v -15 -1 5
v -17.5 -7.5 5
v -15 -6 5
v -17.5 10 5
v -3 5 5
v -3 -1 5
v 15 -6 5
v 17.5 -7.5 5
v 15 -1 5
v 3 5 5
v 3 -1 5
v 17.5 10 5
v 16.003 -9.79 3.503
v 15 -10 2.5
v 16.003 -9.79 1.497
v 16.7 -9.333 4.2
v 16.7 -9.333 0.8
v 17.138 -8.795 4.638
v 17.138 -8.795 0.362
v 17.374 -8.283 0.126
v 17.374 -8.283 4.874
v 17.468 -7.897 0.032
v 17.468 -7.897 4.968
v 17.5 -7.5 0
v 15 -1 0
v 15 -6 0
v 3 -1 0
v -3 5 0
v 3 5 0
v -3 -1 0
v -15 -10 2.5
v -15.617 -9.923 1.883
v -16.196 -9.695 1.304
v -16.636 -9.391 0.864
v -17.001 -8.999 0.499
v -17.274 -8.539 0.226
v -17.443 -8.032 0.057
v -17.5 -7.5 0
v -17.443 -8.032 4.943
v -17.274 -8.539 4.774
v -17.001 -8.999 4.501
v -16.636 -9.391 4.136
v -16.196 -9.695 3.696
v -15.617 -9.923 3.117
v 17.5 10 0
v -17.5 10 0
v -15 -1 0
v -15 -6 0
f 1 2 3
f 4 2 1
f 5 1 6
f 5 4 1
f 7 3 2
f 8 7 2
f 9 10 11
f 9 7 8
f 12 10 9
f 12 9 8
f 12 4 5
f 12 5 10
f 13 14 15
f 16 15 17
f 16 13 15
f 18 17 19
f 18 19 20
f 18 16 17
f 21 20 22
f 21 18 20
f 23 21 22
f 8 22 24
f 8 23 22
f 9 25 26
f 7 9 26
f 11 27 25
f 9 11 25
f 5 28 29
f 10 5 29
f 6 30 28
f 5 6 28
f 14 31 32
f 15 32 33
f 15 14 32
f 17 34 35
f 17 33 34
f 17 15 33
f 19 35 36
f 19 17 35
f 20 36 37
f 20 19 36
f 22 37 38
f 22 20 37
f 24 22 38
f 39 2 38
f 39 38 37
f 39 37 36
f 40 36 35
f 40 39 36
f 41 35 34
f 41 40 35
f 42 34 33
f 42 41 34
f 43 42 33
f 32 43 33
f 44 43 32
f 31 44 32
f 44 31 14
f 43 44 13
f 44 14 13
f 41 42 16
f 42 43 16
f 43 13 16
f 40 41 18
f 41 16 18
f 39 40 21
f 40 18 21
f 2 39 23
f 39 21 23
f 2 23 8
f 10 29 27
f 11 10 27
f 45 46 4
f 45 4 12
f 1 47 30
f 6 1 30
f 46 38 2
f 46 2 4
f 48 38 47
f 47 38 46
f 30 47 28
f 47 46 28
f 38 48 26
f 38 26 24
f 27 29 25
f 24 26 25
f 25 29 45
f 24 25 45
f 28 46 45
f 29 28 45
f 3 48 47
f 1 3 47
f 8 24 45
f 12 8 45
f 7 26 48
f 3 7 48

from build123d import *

# Parameters (mm, degrees)
F0_W     = 35
F0_H     = 20
F1_DEPTH = 5
F2_R     = 2.49999


# Not quite as in the source:
# - a fillet or chamfer is up to 0.001 mm smaller than in the source, because OpenCascade refuses the exact size


with BuildPart() as f1:
    # F0 (on Top) → F1 (new body)
    with BuildSketch(Plane.XY):
        Rectangle(F0_W, F0_H)
        Polygon((3, -1), (15, -1), (15, -6), (-15, -6), (-15, -1), (-3, -1), (-3, 5), (3, 5), align=None, mode=Mode.SUBTRACT)
    extrude(amount=F1_DEPTH)

    # F2 (radius 2.5 in the source; OpenCascade refuses exactly that, so slightly less here)
    f2_edges = [f1.edges().sort_by_distance(p)[0] for p in [
        (-17.5, -10, 2.5),
        (17.5, -10, 2.5),
        (0, -10, 0),
        (0, -10, 5),
    ]]
    fillet(f2_edges, radius=F2_R)


solid = f1.part
